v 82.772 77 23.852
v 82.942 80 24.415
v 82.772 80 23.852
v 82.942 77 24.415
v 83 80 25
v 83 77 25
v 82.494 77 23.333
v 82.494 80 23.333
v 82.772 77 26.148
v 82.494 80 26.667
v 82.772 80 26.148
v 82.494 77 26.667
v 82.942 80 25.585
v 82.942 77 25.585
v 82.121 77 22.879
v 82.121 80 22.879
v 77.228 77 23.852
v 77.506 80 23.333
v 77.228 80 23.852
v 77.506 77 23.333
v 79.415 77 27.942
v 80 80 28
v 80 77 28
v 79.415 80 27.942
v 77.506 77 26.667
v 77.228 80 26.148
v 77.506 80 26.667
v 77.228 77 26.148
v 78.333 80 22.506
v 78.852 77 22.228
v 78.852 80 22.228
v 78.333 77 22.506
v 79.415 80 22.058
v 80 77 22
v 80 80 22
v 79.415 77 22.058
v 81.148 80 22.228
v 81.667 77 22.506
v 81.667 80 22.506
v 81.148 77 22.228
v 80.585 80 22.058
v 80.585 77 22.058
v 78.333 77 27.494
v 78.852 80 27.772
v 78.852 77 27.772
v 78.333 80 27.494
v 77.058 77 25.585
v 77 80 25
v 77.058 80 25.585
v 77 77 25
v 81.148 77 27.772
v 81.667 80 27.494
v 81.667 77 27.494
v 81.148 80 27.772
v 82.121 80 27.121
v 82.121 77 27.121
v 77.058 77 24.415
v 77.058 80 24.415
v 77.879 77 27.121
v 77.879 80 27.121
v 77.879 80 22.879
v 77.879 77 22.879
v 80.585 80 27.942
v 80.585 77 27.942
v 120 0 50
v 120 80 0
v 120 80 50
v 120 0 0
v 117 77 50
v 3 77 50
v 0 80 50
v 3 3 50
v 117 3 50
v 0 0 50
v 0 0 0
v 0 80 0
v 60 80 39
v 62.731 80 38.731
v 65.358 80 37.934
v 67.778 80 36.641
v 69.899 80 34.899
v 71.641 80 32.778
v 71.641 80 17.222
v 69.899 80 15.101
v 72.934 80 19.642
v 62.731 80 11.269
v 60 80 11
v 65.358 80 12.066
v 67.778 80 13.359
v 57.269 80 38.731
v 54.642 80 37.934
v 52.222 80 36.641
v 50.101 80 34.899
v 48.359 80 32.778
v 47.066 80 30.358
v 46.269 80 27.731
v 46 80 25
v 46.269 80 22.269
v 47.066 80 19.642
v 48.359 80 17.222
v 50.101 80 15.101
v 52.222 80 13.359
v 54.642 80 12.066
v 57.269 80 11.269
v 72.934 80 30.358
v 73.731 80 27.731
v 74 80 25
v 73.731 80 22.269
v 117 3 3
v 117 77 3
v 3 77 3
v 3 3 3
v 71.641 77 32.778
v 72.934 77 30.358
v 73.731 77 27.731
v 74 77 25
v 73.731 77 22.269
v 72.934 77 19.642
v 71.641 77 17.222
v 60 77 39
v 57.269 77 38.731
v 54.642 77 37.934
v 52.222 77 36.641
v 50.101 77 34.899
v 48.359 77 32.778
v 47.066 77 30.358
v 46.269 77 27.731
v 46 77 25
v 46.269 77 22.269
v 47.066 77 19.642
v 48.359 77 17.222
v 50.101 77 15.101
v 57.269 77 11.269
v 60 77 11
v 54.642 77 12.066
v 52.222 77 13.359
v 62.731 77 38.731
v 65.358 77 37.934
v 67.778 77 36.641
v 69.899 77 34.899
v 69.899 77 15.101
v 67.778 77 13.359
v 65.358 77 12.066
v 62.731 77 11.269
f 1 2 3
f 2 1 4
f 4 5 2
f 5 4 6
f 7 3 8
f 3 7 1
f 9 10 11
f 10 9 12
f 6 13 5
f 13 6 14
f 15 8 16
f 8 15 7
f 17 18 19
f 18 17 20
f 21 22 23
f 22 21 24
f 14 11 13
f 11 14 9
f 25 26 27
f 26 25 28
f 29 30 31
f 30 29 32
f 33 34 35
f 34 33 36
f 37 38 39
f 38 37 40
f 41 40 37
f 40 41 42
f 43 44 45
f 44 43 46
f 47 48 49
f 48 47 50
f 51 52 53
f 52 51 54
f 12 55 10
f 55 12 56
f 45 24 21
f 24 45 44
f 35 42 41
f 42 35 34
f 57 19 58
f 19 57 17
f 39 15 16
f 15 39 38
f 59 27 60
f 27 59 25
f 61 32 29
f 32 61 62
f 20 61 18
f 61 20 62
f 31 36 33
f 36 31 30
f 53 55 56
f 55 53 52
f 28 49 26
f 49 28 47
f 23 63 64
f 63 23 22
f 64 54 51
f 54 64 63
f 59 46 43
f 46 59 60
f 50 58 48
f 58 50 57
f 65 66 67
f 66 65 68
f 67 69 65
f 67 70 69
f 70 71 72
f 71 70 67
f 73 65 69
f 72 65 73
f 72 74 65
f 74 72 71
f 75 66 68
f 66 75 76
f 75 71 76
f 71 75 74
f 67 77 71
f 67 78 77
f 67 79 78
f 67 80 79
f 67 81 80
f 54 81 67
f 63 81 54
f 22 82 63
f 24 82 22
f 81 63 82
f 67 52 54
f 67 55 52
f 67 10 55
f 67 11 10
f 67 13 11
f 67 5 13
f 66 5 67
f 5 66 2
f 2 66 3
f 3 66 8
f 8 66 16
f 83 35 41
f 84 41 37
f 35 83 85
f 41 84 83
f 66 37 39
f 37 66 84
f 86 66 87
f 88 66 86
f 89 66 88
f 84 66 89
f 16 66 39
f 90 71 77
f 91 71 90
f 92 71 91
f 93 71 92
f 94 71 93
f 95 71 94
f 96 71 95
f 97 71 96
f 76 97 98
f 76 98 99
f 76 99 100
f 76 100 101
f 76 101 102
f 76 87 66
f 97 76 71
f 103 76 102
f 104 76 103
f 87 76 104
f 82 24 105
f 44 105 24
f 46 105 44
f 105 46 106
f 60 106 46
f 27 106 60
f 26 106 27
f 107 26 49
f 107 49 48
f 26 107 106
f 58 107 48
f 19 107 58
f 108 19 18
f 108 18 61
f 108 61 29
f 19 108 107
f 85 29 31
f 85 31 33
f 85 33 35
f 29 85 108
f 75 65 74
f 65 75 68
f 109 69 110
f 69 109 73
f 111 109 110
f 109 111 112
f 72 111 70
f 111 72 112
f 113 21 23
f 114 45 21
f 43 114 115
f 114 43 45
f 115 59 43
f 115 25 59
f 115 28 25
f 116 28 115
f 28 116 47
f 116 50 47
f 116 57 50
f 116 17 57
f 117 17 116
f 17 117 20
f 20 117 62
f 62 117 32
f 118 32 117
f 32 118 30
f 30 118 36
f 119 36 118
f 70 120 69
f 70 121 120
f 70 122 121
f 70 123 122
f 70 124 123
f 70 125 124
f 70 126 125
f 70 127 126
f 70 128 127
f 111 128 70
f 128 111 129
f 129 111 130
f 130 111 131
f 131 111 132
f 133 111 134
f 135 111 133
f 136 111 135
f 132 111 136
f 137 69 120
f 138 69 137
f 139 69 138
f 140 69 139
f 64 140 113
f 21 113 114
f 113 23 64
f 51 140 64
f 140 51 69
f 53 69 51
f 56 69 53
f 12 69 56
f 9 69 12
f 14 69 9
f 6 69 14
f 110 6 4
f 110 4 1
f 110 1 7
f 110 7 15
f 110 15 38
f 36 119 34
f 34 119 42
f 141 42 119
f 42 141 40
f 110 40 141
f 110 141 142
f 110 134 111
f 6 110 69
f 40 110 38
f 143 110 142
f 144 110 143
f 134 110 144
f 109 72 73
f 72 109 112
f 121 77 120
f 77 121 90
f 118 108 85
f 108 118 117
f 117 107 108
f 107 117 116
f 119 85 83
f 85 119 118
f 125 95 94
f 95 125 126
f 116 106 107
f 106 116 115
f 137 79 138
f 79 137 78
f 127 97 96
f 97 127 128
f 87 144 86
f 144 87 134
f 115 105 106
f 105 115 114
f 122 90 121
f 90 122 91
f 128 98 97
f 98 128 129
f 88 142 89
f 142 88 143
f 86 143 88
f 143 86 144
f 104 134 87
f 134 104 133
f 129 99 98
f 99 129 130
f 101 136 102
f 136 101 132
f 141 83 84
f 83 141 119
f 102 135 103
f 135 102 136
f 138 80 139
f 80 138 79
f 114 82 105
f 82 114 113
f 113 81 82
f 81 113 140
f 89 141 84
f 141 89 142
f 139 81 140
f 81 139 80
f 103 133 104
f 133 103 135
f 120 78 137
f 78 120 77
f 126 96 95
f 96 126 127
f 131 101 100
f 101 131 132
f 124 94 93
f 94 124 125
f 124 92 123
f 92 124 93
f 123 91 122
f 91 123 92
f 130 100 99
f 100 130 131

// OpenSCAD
$fn = 32;

// ----------------------------------------------------------------------
// Vent box: roundvent enclosure
// ----------------------------------------------------------------------

// --- parameters (mm) ---
box_l = 120;              // box length, X
box_w = 80;               // box width, Y
box_h = 50;               // box height, Z
wall_t = 3;               // shell wall thickness
vent_d = 28;              // central vent diameter
ring_d = 6;               // ring hole diameter
n_ring = 6;               // holes in the ring
ring_r = 20;              // ring radius
fit_tol = 0.02;           // tolerance for press fits, mm
free_tol = 0.2;           // tolerance for clearance fits, mm

ring_step = 360 / n_ring;  // ring hole angular step

difference() {
  cube([box_l, box_w, box_h]);
  translate([wall_t, wall_t, wall_t])
    cube([box_l - 2 * wall_t, box_w - 2 * wall_t, box_h]);
  translate([box_l / 2, box_w - wall_t - 1, box_h / 2])
    rotate([-90, 0, 0]) cylinder(h = wall_t + 2, d = vent_d);
  for (i = [0 : n_ring - 1])
    translate([box_l / 2, box_w - wall_t - 1, box_h / 2])
      rotate([0, 0, i * ring_step])
        translate([ring_r, 0, 0]) rotate([-90, 0, 0])
          cylinder(h = wall_t + 2, d = ring_d);
}
